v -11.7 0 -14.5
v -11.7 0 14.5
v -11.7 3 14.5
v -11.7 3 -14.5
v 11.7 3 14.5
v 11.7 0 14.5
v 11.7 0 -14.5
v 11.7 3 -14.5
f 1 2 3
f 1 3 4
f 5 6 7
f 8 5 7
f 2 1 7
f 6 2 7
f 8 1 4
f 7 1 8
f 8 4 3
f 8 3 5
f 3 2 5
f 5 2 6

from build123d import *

# Parameters (mm, degrees)
BOSS_EXTRUDE1_DEPTH   = 3
BOSS_EXTRUDE1_2_DEPTH = 3
SKETCH1_W             = 23.4
SKETCH1_H             = 29
BOSS_EXTRUDE1_3_DEPTH = 3
SKETCH5_R             = 1.44
CUT_EXTRUDE3_DEPTH    = 10
CUT_EXTRUDE4_DEPTH    = 10
SKETCH9_R             = 3.026992654
BOSS_EXTRUDE3_DEPTH   = 3


with BuildPart() as part:
    # Sketch1 → Boss-Extrude1 (new body)
    with BuildSketch(Plane(origin=(0, 0, 0), x_dir=(1, 0, 0), z_dir=(0, 1, 0))):
        with BuildLine():
            add(Edge.make_bspline(
                [(19.180993887, -14.242526212), (19.80083761, -12.341053413), (17.899318471, -11.721194585), (17.279474749, -13.622667384), (16.659631026, -15.524140184), (18.561150164, -16.143999012), (19.180993887, -14.242526212)],
                knots=[0, 0, 0, 0, 0.5, 0.5, 0.5, 1, 1, 1, 1], degree=3, weights=[1, 0.333333333, 0.333333333, 1, 0.333333333, 0.333333333, 1]))
        make_face()
    extrude(amount=BOSS_EXTRUDE1_DEPTH)


with BuildPart() as body_2:
    # Sketch1 → Boss-Extrude1 2 (new body)
    with BuildSketch(Plane(origin=(0, 0, 0), x_dir=(1, 0, 0), z_dir=(0, 1, 0))):
        with BuildLine():
            add(Edge.make_bspline(
                [(22.488505608, -4.096188772), (23.108349331, -2.194715972), (21.206830193, -1.574857144), (20.58698647, -3.476329943), (19.967142747, -5.377802743), (21.868661885, -5.997661571), (22.488505608, -4.096188772)],
                knots=[0, 0, 0, 0, 0.5, 0.5, 0.5, 1, 1, 1, 1], degree=3, weights=[1, 0.333333333, 0.333333333, 1, 0.333333333, 0.333333333, 1]))
        make_face()
    extrude(amount=BOSS_EXTRUDE1_2_DEPTH)


with BuildPart() as body_3:
    # Sketch1 → Boss-Extrude1 3 (new body)
    with BuildSketch(Plane(origin=(0, 0, 0), x_dir=(1, 0, 0), z_dir=(0, 1, 0))):
        Rectangle(SKETCH1_W, SKETCH1_H)
    extrude(amount=BOSS_EXTRUDE1_3_DEPTH)

    # Sketch5 → Cut-Extrude3 (cut)
    with BuildSketch(Plane.XZ):
        with Locations(Location((-2.145634177, 3.61037734, 0), (0, 0, 270))):
            Circle(SKETCH5_R)
    extrude(amount=-CUT_EXTRUDE3_DEPTH, mode=Mode.SUBTRACT)

    # Sketch9 → Boss-Extrude3 (add)
    with BuildSketch(Plane(origin=(0, 3, 0), x_dir=(1, 0, 0), z_dir=(0, 1, 0))):
        with Locations((-2.145634177, -3.61037734)):
            Circle(SKETCH9_R)
    extrude(amount=-BOSS_EXTRUDE3_DEPTH)


with BuildPart() as cut_extrude4_tool:
    # Sketch7 → Cut-Extrude4 (new body)
    with BuildSketch(Plane(origin=(0, 3, 0), x_dir=(1, 0, 0), z_dir=(0, 1, 0))):
        with BuildLine():
            add(Edge.make_bspline(
                [(19.180993887, -14.242526212), (19.80083761, -12.341053413), (17.899318471, -11.721194585), (17.279474749, -13.622667384), (16.659631026, -15.524140184), (18.561150164, -16.143999012), (19.180993887, -14.242526212)],
                knots=[0, 0, 0, 0, 0.5, 0.5, 0.5, 1, 1, 1, 1], degree=3, weights=[1, 0.333333333, 0.333333333, 1, 0.333333333, 0.333333333, 1]))
        make_face()
        with BuildLine():
            add(Edge.make_bspline(
                [(22.488505608, -4.096188772), (23.108349331, -2.194715972), (21.206830193, -1.574857144), (20.58698647, -3.476329943), (19.967142747, -5.377802743), (21.868661885, -5.997661571), (22.488505608, -4.096188772)],
                knots=[0, 0, 0, 0, 0.5, 0.5, 0.5, 1, 1, 1, 1], degree=3, weights=[1, 0.333333333, 0.333333333, 1, 0.333333333, 0.333333333, 1]))
        make_face()
    extrude(amount=-CUT_EXTRUDE4_DEPTH)


with BuildPart() as part_1:
    add(part.part)

    # Cut-Extrude4: cut by cut_extrude4_tool
    add(cut_extrude4_tool.part, mode=Mode.SUBTRACT)


with BuildPart() as body_2_1:
    add(body_2.part)

    # Cut-Extrude4: cut by cut_extrude4_tool
    add(cut_extrude4_tool.part, mode=Mode.SUBTRACT)


solid = body_3.part
